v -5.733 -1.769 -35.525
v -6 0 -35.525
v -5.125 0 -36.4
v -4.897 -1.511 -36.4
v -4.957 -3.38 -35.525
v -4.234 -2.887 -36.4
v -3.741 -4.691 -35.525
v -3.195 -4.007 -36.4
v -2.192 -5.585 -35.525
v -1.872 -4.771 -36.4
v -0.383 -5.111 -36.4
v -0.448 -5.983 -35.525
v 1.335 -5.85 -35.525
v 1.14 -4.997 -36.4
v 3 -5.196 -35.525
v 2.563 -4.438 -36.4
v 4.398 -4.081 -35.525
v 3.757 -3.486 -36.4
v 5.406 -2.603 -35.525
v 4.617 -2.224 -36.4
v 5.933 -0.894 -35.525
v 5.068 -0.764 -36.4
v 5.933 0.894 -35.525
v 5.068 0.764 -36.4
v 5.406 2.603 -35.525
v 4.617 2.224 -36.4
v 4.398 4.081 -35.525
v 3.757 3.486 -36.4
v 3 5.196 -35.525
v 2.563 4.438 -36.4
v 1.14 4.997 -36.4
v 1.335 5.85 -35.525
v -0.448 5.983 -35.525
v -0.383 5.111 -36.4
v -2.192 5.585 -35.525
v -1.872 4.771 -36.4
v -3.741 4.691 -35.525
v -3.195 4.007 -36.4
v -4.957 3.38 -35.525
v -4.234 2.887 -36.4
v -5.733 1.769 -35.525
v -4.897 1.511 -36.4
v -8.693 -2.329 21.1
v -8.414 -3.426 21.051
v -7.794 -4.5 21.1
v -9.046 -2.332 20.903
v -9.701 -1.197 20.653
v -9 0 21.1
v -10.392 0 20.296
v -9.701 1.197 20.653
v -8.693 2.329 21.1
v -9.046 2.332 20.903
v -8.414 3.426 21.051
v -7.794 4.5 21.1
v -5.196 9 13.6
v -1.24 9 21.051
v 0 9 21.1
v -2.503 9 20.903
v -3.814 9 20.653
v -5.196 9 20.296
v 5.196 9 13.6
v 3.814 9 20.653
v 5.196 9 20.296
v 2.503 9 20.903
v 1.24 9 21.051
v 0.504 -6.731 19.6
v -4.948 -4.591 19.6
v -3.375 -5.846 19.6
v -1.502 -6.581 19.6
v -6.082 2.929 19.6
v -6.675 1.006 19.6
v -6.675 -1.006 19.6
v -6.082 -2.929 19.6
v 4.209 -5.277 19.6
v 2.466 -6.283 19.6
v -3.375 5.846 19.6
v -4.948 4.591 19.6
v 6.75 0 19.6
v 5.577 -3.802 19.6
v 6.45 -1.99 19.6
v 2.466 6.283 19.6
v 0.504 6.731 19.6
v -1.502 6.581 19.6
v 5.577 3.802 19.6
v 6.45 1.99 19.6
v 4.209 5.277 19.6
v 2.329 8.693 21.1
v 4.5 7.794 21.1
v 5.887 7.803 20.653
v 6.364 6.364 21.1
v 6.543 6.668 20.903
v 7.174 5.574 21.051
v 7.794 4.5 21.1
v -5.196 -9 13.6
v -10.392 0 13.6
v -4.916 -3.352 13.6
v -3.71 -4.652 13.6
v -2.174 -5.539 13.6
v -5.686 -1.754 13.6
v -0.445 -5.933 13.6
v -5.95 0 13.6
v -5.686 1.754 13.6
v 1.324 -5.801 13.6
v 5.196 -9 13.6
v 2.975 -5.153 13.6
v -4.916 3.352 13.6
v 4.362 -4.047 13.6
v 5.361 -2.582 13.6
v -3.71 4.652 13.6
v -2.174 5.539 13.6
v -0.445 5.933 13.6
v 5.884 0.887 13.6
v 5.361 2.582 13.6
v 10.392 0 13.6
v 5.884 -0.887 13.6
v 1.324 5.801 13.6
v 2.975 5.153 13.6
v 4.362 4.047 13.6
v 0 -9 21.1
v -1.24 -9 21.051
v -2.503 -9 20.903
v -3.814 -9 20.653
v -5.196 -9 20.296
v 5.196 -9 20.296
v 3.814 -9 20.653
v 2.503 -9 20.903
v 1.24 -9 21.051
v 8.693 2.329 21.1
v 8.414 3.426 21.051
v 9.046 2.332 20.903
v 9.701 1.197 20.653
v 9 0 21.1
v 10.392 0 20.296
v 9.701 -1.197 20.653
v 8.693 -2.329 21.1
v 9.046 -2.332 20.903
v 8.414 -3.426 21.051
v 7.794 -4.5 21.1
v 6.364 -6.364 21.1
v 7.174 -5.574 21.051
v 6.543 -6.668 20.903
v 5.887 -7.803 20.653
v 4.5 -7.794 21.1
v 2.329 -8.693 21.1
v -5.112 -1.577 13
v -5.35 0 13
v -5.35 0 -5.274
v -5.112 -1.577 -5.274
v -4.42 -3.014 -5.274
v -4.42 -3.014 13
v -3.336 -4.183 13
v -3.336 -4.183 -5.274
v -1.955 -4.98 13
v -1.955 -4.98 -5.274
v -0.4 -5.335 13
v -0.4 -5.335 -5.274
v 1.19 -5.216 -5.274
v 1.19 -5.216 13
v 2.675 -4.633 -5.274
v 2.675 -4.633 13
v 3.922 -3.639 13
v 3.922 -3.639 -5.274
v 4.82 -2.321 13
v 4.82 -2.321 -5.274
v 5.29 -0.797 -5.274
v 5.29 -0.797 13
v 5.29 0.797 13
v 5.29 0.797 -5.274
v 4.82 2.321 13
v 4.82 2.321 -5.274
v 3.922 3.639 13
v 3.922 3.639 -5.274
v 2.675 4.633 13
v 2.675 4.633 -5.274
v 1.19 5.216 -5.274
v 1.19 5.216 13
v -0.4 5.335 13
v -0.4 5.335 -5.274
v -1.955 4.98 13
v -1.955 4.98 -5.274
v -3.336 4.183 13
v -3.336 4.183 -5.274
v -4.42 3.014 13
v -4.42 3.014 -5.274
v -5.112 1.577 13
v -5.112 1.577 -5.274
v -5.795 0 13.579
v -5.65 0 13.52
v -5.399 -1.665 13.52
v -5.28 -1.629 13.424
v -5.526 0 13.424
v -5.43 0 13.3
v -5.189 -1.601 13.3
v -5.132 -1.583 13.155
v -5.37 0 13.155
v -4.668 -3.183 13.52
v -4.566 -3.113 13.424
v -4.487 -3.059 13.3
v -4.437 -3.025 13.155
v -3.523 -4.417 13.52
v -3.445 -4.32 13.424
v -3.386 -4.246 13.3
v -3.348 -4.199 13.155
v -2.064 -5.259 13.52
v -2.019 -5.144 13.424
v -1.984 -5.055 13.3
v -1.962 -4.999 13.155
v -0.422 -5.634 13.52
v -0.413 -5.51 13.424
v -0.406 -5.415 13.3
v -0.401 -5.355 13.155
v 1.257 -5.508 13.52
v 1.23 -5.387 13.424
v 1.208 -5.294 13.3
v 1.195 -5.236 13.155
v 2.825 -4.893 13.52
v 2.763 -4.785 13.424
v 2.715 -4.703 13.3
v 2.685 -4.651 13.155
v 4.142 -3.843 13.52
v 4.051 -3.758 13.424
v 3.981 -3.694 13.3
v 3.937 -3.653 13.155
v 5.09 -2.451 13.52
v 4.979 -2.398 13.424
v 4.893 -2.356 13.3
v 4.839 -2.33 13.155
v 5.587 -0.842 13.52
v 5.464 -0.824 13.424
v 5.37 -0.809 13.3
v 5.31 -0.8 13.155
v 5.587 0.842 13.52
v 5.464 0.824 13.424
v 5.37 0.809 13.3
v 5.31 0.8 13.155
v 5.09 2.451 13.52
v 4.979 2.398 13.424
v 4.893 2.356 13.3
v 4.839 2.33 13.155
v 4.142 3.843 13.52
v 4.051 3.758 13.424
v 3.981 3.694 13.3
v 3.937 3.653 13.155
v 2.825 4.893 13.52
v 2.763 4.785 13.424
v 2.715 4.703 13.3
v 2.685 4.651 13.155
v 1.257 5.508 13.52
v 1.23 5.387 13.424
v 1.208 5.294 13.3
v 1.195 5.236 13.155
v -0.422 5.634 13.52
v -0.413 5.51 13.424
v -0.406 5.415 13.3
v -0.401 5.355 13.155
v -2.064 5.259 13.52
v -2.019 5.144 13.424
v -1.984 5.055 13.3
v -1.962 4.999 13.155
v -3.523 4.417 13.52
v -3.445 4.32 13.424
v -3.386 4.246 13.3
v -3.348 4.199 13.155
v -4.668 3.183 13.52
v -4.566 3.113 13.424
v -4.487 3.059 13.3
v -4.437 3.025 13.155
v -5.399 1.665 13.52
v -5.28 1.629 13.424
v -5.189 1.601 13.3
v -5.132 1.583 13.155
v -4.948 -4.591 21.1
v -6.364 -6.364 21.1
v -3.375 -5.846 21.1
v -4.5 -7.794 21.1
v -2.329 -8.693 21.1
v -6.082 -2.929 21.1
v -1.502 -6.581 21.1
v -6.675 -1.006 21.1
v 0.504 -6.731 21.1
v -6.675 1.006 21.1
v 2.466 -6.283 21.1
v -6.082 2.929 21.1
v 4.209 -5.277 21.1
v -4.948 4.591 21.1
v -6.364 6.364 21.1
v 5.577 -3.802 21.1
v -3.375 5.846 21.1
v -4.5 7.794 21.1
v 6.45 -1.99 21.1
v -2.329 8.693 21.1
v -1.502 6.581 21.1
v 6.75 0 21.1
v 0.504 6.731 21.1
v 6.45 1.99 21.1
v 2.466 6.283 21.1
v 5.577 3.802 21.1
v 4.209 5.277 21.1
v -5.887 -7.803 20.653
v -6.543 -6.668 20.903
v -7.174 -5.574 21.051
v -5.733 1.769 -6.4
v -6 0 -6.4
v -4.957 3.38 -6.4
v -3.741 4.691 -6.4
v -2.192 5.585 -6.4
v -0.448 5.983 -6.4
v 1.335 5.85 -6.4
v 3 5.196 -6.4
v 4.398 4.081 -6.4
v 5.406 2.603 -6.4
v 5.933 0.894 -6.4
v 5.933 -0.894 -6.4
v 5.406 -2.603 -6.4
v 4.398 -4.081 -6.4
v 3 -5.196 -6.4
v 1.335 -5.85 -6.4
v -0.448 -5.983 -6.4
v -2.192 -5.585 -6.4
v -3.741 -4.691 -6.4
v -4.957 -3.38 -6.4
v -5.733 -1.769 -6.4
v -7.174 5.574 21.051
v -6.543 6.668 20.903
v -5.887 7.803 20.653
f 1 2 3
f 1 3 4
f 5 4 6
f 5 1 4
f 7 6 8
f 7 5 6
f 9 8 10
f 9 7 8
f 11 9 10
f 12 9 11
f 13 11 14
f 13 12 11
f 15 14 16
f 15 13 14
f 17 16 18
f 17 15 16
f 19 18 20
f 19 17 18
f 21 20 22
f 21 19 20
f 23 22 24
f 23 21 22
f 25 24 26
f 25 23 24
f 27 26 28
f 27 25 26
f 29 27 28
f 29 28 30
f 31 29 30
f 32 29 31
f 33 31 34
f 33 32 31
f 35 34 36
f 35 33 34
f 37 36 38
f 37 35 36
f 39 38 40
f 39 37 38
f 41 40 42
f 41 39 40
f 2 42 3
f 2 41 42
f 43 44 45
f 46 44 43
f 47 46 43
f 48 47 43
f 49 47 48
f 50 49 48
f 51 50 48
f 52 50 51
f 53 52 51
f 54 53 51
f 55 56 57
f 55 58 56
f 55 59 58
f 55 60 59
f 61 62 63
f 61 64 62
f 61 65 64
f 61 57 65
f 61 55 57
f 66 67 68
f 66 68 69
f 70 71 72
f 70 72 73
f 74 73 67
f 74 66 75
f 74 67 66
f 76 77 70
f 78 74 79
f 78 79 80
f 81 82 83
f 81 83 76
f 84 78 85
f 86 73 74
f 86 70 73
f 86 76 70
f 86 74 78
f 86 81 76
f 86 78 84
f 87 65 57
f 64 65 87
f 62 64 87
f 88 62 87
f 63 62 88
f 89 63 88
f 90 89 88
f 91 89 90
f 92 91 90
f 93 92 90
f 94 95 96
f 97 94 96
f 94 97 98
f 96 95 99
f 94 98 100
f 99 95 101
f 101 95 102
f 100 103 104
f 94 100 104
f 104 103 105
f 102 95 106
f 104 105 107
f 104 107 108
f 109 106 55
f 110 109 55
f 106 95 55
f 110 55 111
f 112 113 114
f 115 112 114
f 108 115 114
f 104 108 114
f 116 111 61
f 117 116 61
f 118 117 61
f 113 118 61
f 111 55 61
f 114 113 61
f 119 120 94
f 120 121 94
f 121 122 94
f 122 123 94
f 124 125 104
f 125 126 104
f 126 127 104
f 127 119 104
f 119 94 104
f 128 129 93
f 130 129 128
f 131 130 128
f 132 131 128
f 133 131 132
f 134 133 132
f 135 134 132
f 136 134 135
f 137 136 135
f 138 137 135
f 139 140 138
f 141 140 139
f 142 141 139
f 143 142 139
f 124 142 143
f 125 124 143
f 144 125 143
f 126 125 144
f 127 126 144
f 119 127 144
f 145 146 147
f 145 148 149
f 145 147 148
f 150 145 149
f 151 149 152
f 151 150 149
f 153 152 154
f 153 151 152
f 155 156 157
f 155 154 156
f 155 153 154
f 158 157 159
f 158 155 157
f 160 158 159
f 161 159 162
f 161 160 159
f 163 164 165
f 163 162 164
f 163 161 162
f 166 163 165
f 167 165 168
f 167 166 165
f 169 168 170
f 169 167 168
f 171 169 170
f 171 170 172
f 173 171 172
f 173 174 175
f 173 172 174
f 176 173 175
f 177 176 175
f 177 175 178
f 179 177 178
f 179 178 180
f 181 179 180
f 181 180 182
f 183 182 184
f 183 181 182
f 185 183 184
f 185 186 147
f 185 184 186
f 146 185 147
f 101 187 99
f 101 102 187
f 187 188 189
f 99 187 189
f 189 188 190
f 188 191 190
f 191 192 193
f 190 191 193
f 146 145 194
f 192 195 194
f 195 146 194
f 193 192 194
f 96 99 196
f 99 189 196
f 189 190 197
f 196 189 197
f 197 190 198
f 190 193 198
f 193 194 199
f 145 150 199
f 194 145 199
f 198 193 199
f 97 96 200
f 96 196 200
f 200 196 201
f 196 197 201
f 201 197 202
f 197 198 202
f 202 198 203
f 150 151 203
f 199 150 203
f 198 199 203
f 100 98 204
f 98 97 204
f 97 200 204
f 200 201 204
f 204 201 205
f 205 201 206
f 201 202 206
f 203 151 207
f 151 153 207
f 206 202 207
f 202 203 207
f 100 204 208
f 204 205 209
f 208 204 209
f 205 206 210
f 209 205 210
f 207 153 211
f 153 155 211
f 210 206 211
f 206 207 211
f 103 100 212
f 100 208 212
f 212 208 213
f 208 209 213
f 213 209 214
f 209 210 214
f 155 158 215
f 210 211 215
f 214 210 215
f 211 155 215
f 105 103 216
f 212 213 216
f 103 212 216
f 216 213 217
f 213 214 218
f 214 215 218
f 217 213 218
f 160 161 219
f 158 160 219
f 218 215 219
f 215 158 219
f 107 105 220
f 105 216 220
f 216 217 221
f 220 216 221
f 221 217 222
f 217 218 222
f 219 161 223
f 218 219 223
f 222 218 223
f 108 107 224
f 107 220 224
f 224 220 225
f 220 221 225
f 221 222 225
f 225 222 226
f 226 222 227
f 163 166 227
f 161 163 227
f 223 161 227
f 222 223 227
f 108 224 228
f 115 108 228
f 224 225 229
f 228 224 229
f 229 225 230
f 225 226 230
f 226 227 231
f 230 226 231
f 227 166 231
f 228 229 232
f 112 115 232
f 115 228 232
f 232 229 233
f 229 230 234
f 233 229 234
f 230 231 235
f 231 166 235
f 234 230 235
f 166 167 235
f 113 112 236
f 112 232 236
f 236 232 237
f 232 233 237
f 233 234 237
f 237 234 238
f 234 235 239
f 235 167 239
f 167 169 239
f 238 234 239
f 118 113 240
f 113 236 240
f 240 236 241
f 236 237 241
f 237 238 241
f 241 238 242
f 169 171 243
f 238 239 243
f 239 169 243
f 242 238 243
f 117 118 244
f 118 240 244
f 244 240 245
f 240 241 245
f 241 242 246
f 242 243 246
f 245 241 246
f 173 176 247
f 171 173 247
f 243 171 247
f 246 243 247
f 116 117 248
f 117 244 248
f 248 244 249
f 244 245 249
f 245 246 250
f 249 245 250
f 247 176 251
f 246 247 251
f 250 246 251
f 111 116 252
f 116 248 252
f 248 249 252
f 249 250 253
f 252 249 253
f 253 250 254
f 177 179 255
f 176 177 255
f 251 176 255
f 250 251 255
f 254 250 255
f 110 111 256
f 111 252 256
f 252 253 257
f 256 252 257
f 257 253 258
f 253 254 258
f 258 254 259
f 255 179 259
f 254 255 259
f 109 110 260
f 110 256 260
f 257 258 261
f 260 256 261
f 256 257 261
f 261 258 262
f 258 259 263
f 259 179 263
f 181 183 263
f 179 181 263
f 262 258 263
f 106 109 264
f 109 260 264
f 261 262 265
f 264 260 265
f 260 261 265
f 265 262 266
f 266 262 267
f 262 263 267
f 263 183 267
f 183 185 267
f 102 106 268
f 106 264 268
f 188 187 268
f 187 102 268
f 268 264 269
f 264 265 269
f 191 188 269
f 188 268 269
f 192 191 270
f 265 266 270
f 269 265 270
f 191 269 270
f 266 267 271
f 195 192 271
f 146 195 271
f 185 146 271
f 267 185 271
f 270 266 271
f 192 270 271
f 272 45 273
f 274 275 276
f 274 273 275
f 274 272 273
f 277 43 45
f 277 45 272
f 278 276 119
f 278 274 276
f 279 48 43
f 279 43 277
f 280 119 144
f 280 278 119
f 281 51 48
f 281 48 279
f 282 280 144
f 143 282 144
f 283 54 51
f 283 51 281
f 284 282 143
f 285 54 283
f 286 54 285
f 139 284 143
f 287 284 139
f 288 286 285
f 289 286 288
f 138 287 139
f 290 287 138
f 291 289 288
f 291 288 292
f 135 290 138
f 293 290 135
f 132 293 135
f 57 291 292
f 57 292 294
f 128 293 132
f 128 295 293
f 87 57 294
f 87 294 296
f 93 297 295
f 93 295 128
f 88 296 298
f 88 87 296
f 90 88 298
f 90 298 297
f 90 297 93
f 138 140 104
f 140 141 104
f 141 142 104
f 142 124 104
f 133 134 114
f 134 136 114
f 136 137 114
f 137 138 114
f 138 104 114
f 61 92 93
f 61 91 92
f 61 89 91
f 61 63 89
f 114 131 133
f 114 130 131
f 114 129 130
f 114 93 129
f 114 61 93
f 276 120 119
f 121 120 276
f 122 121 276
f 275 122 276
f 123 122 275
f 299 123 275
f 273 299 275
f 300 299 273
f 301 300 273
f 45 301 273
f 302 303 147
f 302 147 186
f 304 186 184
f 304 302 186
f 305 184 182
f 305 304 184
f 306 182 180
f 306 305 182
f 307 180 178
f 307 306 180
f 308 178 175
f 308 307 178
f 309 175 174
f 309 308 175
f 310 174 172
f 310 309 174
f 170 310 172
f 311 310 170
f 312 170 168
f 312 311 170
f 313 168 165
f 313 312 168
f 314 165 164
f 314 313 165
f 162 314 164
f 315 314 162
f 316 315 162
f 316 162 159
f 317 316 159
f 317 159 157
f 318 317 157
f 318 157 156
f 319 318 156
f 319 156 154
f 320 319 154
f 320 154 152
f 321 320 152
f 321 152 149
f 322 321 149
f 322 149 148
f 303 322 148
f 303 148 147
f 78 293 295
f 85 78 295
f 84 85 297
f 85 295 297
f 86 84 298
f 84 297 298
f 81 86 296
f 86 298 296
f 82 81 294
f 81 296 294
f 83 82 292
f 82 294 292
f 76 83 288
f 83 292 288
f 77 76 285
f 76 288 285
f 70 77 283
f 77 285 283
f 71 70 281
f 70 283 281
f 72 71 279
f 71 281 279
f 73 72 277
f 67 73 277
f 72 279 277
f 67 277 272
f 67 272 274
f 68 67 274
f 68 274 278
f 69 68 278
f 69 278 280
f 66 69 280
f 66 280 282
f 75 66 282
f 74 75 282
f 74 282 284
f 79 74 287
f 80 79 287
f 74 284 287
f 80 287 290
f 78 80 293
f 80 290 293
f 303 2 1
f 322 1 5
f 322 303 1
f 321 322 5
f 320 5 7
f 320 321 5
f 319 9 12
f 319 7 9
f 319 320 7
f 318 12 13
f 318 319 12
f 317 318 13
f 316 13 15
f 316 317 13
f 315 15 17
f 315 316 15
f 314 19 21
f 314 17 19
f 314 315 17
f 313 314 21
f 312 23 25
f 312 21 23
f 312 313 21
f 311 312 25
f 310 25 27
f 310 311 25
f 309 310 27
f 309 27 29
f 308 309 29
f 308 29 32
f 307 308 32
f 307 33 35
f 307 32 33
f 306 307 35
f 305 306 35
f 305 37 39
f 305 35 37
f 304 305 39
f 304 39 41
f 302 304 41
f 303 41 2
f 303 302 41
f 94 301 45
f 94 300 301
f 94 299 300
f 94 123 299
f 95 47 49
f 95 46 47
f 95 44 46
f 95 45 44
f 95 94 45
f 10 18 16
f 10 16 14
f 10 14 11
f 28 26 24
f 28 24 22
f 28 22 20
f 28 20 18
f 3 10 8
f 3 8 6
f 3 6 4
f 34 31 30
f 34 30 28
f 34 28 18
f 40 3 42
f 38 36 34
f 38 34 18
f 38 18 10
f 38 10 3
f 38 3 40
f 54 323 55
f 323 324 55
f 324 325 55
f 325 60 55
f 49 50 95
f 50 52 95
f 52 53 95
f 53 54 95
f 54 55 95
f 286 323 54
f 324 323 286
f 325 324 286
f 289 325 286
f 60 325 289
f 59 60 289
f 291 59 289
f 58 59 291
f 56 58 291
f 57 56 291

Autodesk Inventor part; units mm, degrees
ref_plane "YZ Plane" through (0, 0, 0) normal (1, 0, 0) x (0, 1, 0)
sketch "Sketch2" plane through (0, 0, 0) normal (0, 1, 0) x (-1, 0, 0)
  line L0 (0, 13.5999) -> (0, -36.4001)
  line L1 (0, -36.4001) -> (5.125, -36.4001)
  line L2 (6, -35.5251) -> (6, -6.4001)
  line L3 (6, -6.4001) -> (5.35, -5.2742)
  line L4 (5.35, -5.2742) -> (5.35, 13.5999)
  line L5 (5.35, 13.5999) -> (0, 13.5999)
  line L6 (5.125, -36.4001) -> (6, -35.5251)
  line L7 (6, -36.4001) -> (6, -37.6375)
  line L8 (0, -47.885) -> (0, 23.8474) projected
  dimension "Ds" = 10.7
  dimension "NND" = 12
  dimension "b" = 30
  dimension "d3" = 30
  dimension "d5" = 45
  dimension "PTC" = 1.75
  dimension "NLG" = 50
revolve "Revolution1" add sketch "Sketch2" angle 360 about axis through (0, 0, 13.5999) along (0, 0, -1)
sketch "Sketch3" plane through (0, 0, 13.5999) normal (0, 0, 1) x (1, 0, 0)
  circle A0 centre (0, 0) radius 5.35 projected
  line L0 (0, 9) -> (5.1962, 9)
  line L1 (5.1962, 9) -> (10.3923, 0)
  line L2 (10.3923, 0) -> (0, 0)
  line L3 (0, 0) -> (0, 9)
  line L4 (0, 9) -> (-5.1962, 9)
  line L5 (-5.1962, 9) -> (-10.3923, 0)
  line L6 (0, -9) -> (5.1962, -9)
  line L7 (5.1962, -9) -> (10.3923, 0)
  line L8 (-5.1962, -9) -> (-10.3923, 0)
  line L9 (0, -9) -> (-5.1962, -9)
  dimension "d9" = 60
  dimension "ParS" = 18
  dimension "msp_d11" = 18
extrude "Extrusion1" add sketch "Sketch3" along normal blind 7.5
sketch "Sketch4" plane through (0, 0, 0) normal (0, 1, 0) x (-1, 0, 0)
  line L0 (-9, 21.0999) -> (-10.3923, 21.0999)
  line L1 (-10.3923, 21.0999) -> (-10.3923, 20.2961)
  line L2 (-10.3923, 20.2961) -> (-9, 21.0999)
  line L3 (0, 10.7234) -> (0, 30.8591) projected
  line L4 (0, 27.9826) -> (0, 27.1787)
  line L5 (-10.3923, 13.5999) -> (-10.3923, 21.0999) projected
  line L6 (-5.1962, 21.0999) -> (-10.3923, 21.0999) projected
  dimension "d14" = 30
  dimension "msp_d15" = 18
revolve "Revolution2" cut sketch "Sketch4" angle 360 about axis through (0, 0, 27.9826) along (0, 0, -1)
sketch "Sketch5" plane through (0, 0, 21.0999) normal (0, 0, 1) x (1, 0, 0)
  arc A0 (7.7942, 4.5) -> (0, 9) centre (0, 0) ccw projected
  circle A1 centre (0, 0) radius 6.75
  dimension "d27" = 13.5
extrude "Extrusion2" cut sketch "Sketch5" against normal blind 1.5
thread "Thread1" size "M12x1.75" class "6g" standard "ISO Metric profile" full length
ref_plane "MSC_PF1" through (0, 0, 0) normal (0, 1, 0) x (-1, 0, 0)
ref_plane "MSC_PT1" through (0, 0, 13.5999) normal (0, 0, -1) x (-1, 0, 0)
fillet "Fillet1" radius 0.6 1 edges at (5.35, 0, 13.5999)
equation "\"msp_d11\" = ParS"
equation "\"msp_d15\" = ParS"
equation "\"d27\" = 0.75 * ParS"
equation "\"d28\" = 0.2 * ParK"
equation "\"d30\" = r"
equation "\"msp_d17\" = b"
equation "\"r\" = 0.6"
equation "\"THREADDIA\" = NND"
equation "\"ParK\" = 7.5"
properties part number "ISO 4015 - M12 x 50" material "Stainless Steel, 440C"
